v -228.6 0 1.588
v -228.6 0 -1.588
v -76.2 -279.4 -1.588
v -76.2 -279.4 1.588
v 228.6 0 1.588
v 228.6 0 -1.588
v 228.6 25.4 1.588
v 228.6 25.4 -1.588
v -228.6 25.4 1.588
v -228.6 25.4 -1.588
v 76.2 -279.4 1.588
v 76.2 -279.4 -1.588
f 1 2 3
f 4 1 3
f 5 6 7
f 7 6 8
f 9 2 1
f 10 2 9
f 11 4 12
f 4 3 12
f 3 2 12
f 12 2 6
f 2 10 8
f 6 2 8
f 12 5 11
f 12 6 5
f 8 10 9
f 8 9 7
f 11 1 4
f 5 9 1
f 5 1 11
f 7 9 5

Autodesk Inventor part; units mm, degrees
ref_plane "YZ Plane" through (0, 0, 0) normal (1, 0, 0) x (0, 1, 0)
ref_plane "XZ Plane" through (0, 0, 0) normal (0, 1, 0) x (-1, 0, 0)
ref_plane "XY Plane" through (0, 0, 0) normal (0, 0, 1) x (1, 0, 0)
sketch "Sketch1" plane through (0, 0, 0) normal (0, 0, 1) x (1, 0, 0)
  line L0 (-320.04, 0) -> (320.04, 0) projected
  line L1 (0, -340.36) -> (0, 86.36) projected
  line L2 (-228.6, 25.4) -> (228.6, 25.4)
  line L3 (-76.2, -279.4) -> (76.2, -279.4)
  line L4 (-228.6, 0) -> (-76.2, -279.4)
  line L5 (228.6, 0) -> (76.2, -279.4)
  line L6 (228.6, 0) -> (228.6, 25.4)
  line L7 (-228.6, 0) -> (-228.6, 25.4)
  point P0 (0, 0)
  point P1 (0, 25.4)
  point P2 (0, -279.4)
  point P3 (0, 25.4)
  dimension "d0" = 152.4
  dimension "d2" = 304.8
  dimension "d7" = 25.4
  dimension "d8" = 457.2
extrude "Extrusion1" add sketch "Sketch1" along normal mid plane 3.175
properties part number "electrical board back" material "ABS Plastic"
